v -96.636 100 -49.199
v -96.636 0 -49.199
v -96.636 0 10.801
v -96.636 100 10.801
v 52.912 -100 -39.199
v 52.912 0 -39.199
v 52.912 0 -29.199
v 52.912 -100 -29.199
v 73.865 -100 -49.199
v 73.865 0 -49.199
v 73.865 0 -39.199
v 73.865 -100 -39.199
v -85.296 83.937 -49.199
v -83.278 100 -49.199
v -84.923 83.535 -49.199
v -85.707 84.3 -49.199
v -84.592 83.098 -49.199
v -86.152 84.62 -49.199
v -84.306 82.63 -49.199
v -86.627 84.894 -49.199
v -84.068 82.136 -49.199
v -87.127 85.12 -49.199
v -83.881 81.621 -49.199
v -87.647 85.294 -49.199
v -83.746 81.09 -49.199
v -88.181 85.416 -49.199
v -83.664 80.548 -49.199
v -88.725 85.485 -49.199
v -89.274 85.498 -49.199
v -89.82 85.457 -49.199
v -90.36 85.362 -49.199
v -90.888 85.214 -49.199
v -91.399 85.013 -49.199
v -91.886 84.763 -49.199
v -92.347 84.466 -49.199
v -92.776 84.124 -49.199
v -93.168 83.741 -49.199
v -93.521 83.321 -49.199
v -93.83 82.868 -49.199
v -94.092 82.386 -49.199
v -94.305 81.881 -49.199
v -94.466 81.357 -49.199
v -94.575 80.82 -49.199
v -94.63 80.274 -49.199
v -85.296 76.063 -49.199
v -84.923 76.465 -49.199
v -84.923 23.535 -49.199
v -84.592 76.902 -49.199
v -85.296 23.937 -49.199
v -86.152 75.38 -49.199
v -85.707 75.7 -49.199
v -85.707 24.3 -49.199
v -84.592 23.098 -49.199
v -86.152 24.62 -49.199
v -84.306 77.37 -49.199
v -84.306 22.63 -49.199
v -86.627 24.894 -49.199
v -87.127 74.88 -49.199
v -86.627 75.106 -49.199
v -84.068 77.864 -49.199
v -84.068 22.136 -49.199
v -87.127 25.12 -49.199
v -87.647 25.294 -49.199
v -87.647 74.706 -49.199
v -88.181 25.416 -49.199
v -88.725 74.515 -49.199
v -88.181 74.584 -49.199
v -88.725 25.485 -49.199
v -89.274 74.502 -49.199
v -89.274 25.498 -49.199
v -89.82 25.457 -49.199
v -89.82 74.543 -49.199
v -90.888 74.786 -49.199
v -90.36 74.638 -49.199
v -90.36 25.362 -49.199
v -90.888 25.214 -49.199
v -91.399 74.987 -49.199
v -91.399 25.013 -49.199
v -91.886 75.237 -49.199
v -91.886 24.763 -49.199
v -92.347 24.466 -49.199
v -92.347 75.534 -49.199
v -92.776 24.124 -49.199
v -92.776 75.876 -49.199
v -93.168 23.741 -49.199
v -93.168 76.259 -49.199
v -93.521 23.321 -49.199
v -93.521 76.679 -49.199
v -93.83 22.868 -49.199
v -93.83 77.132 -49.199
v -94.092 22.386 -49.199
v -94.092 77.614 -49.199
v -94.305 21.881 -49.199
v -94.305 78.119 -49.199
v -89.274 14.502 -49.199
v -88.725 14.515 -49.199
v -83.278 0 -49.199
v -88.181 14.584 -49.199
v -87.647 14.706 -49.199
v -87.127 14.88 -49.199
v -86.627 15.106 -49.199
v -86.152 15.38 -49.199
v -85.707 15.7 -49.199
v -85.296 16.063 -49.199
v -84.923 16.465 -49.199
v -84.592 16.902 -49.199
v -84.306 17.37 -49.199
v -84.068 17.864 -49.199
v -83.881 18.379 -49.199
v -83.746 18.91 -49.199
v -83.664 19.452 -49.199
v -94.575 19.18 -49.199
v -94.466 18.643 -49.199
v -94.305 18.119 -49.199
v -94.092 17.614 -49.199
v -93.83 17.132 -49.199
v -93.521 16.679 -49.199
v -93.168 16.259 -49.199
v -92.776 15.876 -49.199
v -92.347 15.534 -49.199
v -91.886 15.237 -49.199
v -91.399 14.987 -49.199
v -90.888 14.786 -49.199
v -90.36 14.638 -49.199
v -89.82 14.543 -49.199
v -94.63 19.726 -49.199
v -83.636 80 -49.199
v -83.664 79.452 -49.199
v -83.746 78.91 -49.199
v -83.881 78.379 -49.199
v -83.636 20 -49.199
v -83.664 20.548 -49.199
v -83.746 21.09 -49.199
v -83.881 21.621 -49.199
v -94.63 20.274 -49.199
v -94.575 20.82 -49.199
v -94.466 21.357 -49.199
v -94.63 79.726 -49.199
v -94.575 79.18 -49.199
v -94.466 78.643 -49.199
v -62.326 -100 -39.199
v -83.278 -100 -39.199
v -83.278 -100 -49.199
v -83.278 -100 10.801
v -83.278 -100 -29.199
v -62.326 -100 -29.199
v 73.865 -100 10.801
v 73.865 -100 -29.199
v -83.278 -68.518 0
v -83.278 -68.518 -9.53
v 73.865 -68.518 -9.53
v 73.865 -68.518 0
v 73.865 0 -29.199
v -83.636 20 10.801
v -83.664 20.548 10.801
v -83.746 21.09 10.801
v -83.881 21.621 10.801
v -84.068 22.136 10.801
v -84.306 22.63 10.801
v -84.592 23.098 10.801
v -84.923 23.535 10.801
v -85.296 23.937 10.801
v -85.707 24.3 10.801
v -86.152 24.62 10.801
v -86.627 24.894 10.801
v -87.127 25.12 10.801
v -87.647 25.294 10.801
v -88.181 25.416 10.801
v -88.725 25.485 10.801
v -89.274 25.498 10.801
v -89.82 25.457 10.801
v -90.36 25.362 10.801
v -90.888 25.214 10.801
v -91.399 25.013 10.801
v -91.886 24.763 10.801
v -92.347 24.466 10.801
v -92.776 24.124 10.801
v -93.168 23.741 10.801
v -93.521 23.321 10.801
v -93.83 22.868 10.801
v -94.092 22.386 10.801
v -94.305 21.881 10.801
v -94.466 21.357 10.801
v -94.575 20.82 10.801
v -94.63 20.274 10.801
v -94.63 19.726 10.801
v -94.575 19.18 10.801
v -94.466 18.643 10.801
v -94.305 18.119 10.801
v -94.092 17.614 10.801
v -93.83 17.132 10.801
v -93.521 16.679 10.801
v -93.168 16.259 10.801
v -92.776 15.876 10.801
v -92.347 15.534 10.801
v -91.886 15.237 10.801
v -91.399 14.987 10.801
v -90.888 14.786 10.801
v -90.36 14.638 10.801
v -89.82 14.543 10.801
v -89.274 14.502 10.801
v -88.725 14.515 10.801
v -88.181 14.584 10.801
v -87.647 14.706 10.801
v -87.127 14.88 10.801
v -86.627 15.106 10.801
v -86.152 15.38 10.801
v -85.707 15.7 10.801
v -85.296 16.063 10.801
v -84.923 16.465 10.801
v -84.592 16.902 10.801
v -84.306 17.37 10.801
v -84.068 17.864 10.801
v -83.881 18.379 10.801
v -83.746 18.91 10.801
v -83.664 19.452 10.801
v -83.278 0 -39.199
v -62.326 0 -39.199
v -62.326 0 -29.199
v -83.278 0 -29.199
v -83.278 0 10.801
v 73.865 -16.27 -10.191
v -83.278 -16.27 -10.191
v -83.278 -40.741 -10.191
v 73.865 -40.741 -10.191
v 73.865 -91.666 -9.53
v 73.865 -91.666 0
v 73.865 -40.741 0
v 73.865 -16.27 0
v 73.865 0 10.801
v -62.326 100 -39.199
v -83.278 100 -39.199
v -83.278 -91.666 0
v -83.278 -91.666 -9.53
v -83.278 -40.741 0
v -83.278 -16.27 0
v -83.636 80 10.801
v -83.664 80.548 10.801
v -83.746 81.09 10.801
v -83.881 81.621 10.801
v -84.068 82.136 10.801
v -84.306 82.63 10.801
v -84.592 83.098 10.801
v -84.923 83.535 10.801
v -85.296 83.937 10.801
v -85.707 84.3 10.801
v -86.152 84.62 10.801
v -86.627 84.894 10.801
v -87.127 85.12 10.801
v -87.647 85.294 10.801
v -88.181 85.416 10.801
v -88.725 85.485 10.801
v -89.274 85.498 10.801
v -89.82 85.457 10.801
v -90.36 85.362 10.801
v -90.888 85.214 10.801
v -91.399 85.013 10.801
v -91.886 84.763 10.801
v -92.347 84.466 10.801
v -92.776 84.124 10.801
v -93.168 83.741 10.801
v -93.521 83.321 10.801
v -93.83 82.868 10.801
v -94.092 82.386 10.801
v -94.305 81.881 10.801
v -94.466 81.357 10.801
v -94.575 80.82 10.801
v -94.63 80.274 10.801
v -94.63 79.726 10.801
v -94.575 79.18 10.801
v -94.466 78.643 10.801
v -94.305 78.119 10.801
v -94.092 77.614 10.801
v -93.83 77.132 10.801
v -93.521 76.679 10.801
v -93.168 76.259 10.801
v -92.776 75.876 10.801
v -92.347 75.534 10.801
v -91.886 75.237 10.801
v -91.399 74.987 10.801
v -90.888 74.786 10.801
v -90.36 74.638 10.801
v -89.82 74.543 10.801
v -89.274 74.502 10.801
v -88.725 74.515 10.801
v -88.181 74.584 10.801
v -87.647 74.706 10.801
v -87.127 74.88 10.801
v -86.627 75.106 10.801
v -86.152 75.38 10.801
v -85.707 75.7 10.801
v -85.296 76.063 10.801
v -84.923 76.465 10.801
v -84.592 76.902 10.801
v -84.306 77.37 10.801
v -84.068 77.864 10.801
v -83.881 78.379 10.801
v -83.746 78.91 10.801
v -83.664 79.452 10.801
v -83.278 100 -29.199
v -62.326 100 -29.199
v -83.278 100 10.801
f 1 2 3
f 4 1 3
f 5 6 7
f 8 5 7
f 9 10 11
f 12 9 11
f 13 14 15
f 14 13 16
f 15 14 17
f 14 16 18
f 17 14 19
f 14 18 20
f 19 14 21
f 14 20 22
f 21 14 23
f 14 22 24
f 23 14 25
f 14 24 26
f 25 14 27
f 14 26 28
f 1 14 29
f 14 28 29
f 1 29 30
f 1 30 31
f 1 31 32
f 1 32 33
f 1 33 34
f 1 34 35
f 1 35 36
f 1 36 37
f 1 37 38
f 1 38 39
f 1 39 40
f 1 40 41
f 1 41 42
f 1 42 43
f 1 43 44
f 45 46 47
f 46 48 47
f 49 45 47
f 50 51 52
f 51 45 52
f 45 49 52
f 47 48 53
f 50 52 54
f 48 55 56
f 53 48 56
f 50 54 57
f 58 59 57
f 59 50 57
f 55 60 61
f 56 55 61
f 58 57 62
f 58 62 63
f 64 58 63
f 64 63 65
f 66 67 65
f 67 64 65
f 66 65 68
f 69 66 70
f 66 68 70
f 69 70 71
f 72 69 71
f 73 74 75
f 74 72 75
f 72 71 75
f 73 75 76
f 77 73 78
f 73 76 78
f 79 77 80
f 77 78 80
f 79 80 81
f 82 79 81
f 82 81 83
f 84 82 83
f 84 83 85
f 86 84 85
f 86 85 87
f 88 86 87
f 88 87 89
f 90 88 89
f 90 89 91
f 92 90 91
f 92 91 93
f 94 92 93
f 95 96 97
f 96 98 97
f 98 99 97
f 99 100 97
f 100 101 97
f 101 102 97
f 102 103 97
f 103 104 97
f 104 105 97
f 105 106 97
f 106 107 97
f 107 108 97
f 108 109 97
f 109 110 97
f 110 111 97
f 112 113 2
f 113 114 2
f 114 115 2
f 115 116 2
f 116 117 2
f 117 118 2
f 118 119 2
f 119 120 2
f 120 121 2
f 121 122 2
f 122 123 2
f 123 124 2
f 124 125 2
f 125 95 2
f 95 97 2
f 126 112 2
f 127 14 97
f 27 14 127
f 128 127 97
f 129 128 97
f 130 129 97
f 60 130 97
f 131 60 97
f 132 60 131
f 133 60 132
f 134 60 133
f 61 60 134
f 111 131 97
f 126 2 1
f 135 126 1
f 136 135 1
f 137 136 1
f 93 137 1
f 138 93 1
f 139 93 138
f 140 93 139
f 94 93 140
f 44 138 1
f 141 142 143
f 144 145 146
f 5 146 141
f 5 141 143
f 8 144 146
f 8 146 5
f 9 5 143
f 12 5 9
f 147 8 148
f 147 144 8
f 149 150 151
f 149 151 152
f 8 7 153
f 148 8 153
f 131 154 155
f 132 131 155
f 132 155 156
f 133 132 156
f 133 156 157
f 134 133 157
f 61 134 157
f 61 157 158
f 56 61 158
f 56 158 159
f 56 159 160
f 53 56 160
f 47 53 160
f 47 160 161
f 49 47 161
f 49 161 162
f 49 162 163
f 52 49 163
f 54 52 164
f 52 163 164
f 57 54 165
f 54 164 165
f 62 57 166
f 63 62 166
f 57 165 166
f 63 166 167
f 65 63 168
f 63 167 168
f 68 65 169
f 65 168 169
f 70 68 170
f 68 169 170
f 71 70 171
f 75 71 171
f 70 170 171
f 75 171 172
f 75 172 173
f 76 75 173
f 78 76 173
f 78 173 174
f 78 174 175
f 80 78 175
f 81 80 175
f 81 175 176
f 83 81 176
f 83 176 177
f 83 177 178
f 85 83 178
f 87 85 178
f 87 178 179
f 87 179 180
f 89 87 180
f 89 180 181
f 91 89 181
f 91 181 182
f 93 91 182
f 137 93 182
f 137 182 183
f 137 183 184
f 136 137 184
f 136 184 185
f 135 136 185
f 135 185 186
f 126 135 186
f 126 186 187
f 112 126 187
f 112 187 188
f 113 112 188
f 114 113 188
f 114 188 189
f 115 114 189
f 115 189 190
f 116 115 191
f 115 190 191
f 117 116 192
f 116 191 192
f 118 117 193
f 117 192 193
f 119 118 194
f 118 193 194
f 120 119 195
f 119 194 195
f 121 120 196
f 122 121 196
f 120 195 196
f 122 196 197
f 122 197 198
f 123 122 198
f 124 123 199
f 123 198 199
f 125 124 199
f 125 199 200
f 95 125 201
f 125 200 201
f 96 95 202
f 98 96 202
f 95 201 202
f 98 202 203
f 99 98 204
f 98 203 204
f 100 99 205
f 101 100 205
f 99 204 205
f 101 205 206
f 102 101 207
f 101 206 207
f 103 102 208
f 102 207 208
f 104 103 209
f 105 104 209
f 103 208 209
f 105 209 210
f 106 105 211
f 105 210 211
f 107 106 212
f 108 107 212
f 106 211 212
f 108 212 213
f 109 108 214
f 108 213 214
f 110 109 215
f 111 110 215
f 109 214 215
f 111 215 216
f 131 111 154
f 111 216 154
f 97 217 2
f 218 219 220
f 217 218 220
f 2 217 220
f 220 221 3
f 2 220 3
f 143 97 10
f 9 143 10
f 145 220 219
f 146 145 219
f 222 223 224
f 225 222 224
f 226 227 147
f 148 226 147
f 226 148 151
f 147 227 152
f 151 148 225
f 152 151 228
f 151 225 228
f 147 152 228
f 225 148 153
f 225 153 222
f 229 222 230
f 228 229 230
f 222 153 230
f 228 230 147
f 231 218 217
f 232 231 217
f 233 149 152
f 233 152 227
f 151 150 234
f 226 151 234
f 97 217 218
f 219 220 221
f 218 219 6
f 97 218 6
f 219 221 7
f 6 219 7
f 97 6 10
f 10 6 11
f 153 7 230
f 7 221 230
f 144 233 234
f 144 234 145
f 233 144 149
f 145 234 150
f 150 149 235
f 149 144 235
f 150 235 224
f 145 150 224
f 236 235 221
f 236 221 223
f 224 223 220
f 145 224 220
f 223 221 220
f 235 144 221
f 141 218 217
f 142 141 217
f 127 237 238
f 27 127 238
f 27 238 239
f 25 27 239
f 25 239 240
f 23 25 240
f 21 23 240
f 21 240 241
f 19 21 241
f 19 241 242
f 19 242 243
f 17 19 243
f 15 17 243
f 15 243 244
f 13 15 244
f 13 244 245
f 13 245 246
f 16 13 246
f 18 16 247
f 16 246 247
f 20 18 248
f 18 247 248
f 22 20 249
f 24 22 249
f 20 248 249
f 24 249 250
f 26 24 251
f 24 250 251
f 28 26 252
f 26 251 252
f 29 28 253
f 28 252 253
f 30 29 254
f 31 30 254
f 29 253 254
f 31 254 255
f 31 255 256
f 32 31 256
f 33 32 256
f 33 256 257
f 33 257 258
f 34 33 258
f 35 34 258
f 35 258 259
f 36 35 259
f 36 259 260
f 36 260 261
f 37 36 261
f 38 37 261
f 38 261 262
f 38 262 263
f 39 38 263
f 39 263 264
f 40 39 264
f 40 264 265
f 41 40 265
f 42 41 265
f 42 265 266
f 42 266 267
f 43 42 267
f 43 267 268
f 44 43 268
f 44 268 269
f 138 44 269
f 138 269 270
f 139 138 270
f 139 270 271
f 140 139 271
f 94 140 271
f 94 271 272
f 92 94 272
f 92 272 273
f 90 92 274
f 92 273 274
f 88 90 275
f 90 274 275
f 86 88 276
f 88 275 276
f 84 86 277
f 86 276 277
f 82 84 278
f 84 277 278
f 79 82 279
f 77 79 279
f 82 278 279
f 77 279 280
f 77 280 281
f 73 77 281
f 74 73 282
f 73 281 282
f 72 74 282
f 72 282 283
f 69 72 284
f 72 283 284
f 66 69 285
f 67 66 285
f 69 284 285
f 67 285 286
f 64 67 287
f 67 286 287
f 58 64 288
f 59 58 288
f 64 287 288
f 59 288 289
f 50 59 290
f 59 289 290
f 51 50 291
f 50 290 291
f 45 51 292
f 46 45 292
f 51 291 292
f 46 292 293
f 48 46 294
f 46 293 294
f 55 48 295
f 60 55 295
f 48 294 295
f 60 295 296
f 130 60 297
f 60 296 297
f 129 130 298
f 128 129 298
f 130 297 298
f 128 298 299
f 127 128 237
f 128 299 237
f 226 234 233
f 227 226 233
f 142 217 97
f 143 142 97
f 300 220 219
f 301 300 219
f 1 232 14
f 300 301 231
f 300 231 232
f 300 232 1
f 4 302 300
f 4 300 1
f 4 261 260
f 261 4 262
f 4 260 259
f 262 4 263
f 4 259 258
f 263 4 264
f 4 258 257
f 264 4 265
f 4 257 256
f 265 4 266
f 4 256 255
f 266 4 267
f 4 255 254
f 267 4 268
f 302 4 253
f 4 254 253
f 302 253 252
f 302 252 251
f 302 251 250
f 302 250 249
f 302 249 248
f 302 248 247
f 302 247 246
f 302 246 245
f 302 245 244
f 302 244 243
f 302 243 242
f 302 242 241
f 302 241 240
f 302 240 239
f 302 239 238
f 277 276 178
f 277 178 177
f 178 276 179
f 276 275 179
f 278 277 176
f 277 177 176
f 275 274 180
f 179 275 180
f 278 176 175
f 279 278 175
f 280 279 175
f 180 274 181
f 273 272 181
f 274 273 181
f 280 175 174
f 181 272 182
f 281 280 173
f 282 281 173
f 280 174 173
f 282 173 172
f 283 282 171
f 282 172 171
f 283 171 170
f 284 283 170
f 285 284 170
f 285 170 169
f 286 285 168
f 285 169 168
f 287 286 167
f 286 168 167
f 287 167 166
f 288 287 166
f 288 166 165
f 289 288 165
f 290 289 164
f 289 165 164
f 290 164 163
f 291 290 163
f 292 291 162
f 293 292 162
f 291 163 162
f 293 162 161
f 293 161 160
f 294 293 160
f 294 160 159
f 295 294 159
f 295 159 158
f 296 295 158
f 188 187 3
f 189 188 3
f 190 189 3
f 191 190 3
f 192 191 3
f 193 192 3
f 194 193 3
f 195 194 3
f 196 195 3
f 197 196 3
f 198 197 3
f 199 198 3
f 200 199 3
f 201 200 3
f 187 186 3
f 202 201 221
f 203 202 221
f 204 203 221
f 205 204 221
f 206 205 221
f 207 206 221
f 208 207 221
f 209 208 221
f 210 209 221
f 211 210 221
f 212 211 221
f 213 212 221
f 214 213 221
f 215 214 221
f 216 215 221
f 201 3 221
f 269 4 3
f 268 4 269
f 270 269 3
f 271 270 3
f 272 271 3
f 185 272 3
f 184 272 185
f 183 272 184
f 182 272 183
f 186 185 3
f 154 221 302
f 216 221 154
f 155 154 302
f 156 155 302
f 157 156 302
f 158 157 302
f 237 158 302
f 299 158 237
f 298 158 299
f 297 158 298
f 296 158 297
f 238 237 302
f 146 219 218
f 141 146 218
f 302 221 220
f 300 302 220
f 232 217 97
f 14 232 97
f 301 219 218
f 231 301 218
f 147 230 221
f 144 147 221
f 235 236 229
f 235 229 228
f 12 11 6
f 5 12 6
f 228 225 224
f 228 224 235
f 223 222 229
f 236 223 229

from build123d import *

# Parameters (mm, degrees)
F1_DEPTH = 100
F3_DEPTH = 100
F4_W     = 24.470467
F4_H     = 10.191035
F4_W_2   = 23.147739
F4_H_2   = 9.529671
F5_DEPTH = 157.143865
F6_R     = 5.5
F7_DEPTH = 60.001


with BuildPart() as f1:
    # F0 (on Front) → F1 (new body)
    with BuildSketch(Plane.XZ):
        Polygon((73.864535, -29.198988), (73.864535, 10.801012), (-83.27833, 10.801012), (-83.27833, -29.198988), (-62.325943, -29.198988), (-62.325943, -39.198988), (-83.27833, -39.198988), (-83.27833, -49.198988), (73.864535, -49.198988), (73.864535, -39.198988), (52.912148, -39.198988), (52.912148, -29.198988), align=None)
    extrude(amount=F1_DEPTH)

    # F4 (on face) → F5 (cut, through all)
    with BuildSketch(Plane(origin=(-83.27833, 0, 0), x_dir=(0, -1, 0), z_dir=(-1, 0, 0))):
        with Locations((28.505674, -5.095517)):
            Rectangle(F4_W, F4_H)
        with Locations((80.092061, -4.764836)):
            Rectangle(F4_W_2, F4_H_2)
    extrude(amount=-F5_DEPTH, mode=Mode.SUBTRACT)


with BuildPart() as f3:
    # F2 (on face) → F3 (new body)
    with BuildSketch(Plane(origin=(0, 0, 0), x_dir=(-1, 0, 0), z_dir=(0, 1, 0))):
        Polygon((96.636489, 10.801012), (83.27833, 10.801012), (83.27833, -29.198988), (62.325943, -29.198988), (62.325943, -39.198988), (83.27833, -39.198988), (83.27833, -49.198988), (96.636489, -49.198988), align=None)
    extrude(amount=F3_DEPTH)

    # F6 (on face) → F7 (cut, through all)
    with BuildSketch(Plane.XY.offset(10.801012)):
        with Locations((-89.136489, 80)):
            Circle(F6_R)
        with Locations((-89.136489, 20)):
            Circle(F6_R)
    extrude(amount=-F7_DEPTH, mode=Mode.SUBTRACT)


solid = Compound([f1.part, f3.part])
